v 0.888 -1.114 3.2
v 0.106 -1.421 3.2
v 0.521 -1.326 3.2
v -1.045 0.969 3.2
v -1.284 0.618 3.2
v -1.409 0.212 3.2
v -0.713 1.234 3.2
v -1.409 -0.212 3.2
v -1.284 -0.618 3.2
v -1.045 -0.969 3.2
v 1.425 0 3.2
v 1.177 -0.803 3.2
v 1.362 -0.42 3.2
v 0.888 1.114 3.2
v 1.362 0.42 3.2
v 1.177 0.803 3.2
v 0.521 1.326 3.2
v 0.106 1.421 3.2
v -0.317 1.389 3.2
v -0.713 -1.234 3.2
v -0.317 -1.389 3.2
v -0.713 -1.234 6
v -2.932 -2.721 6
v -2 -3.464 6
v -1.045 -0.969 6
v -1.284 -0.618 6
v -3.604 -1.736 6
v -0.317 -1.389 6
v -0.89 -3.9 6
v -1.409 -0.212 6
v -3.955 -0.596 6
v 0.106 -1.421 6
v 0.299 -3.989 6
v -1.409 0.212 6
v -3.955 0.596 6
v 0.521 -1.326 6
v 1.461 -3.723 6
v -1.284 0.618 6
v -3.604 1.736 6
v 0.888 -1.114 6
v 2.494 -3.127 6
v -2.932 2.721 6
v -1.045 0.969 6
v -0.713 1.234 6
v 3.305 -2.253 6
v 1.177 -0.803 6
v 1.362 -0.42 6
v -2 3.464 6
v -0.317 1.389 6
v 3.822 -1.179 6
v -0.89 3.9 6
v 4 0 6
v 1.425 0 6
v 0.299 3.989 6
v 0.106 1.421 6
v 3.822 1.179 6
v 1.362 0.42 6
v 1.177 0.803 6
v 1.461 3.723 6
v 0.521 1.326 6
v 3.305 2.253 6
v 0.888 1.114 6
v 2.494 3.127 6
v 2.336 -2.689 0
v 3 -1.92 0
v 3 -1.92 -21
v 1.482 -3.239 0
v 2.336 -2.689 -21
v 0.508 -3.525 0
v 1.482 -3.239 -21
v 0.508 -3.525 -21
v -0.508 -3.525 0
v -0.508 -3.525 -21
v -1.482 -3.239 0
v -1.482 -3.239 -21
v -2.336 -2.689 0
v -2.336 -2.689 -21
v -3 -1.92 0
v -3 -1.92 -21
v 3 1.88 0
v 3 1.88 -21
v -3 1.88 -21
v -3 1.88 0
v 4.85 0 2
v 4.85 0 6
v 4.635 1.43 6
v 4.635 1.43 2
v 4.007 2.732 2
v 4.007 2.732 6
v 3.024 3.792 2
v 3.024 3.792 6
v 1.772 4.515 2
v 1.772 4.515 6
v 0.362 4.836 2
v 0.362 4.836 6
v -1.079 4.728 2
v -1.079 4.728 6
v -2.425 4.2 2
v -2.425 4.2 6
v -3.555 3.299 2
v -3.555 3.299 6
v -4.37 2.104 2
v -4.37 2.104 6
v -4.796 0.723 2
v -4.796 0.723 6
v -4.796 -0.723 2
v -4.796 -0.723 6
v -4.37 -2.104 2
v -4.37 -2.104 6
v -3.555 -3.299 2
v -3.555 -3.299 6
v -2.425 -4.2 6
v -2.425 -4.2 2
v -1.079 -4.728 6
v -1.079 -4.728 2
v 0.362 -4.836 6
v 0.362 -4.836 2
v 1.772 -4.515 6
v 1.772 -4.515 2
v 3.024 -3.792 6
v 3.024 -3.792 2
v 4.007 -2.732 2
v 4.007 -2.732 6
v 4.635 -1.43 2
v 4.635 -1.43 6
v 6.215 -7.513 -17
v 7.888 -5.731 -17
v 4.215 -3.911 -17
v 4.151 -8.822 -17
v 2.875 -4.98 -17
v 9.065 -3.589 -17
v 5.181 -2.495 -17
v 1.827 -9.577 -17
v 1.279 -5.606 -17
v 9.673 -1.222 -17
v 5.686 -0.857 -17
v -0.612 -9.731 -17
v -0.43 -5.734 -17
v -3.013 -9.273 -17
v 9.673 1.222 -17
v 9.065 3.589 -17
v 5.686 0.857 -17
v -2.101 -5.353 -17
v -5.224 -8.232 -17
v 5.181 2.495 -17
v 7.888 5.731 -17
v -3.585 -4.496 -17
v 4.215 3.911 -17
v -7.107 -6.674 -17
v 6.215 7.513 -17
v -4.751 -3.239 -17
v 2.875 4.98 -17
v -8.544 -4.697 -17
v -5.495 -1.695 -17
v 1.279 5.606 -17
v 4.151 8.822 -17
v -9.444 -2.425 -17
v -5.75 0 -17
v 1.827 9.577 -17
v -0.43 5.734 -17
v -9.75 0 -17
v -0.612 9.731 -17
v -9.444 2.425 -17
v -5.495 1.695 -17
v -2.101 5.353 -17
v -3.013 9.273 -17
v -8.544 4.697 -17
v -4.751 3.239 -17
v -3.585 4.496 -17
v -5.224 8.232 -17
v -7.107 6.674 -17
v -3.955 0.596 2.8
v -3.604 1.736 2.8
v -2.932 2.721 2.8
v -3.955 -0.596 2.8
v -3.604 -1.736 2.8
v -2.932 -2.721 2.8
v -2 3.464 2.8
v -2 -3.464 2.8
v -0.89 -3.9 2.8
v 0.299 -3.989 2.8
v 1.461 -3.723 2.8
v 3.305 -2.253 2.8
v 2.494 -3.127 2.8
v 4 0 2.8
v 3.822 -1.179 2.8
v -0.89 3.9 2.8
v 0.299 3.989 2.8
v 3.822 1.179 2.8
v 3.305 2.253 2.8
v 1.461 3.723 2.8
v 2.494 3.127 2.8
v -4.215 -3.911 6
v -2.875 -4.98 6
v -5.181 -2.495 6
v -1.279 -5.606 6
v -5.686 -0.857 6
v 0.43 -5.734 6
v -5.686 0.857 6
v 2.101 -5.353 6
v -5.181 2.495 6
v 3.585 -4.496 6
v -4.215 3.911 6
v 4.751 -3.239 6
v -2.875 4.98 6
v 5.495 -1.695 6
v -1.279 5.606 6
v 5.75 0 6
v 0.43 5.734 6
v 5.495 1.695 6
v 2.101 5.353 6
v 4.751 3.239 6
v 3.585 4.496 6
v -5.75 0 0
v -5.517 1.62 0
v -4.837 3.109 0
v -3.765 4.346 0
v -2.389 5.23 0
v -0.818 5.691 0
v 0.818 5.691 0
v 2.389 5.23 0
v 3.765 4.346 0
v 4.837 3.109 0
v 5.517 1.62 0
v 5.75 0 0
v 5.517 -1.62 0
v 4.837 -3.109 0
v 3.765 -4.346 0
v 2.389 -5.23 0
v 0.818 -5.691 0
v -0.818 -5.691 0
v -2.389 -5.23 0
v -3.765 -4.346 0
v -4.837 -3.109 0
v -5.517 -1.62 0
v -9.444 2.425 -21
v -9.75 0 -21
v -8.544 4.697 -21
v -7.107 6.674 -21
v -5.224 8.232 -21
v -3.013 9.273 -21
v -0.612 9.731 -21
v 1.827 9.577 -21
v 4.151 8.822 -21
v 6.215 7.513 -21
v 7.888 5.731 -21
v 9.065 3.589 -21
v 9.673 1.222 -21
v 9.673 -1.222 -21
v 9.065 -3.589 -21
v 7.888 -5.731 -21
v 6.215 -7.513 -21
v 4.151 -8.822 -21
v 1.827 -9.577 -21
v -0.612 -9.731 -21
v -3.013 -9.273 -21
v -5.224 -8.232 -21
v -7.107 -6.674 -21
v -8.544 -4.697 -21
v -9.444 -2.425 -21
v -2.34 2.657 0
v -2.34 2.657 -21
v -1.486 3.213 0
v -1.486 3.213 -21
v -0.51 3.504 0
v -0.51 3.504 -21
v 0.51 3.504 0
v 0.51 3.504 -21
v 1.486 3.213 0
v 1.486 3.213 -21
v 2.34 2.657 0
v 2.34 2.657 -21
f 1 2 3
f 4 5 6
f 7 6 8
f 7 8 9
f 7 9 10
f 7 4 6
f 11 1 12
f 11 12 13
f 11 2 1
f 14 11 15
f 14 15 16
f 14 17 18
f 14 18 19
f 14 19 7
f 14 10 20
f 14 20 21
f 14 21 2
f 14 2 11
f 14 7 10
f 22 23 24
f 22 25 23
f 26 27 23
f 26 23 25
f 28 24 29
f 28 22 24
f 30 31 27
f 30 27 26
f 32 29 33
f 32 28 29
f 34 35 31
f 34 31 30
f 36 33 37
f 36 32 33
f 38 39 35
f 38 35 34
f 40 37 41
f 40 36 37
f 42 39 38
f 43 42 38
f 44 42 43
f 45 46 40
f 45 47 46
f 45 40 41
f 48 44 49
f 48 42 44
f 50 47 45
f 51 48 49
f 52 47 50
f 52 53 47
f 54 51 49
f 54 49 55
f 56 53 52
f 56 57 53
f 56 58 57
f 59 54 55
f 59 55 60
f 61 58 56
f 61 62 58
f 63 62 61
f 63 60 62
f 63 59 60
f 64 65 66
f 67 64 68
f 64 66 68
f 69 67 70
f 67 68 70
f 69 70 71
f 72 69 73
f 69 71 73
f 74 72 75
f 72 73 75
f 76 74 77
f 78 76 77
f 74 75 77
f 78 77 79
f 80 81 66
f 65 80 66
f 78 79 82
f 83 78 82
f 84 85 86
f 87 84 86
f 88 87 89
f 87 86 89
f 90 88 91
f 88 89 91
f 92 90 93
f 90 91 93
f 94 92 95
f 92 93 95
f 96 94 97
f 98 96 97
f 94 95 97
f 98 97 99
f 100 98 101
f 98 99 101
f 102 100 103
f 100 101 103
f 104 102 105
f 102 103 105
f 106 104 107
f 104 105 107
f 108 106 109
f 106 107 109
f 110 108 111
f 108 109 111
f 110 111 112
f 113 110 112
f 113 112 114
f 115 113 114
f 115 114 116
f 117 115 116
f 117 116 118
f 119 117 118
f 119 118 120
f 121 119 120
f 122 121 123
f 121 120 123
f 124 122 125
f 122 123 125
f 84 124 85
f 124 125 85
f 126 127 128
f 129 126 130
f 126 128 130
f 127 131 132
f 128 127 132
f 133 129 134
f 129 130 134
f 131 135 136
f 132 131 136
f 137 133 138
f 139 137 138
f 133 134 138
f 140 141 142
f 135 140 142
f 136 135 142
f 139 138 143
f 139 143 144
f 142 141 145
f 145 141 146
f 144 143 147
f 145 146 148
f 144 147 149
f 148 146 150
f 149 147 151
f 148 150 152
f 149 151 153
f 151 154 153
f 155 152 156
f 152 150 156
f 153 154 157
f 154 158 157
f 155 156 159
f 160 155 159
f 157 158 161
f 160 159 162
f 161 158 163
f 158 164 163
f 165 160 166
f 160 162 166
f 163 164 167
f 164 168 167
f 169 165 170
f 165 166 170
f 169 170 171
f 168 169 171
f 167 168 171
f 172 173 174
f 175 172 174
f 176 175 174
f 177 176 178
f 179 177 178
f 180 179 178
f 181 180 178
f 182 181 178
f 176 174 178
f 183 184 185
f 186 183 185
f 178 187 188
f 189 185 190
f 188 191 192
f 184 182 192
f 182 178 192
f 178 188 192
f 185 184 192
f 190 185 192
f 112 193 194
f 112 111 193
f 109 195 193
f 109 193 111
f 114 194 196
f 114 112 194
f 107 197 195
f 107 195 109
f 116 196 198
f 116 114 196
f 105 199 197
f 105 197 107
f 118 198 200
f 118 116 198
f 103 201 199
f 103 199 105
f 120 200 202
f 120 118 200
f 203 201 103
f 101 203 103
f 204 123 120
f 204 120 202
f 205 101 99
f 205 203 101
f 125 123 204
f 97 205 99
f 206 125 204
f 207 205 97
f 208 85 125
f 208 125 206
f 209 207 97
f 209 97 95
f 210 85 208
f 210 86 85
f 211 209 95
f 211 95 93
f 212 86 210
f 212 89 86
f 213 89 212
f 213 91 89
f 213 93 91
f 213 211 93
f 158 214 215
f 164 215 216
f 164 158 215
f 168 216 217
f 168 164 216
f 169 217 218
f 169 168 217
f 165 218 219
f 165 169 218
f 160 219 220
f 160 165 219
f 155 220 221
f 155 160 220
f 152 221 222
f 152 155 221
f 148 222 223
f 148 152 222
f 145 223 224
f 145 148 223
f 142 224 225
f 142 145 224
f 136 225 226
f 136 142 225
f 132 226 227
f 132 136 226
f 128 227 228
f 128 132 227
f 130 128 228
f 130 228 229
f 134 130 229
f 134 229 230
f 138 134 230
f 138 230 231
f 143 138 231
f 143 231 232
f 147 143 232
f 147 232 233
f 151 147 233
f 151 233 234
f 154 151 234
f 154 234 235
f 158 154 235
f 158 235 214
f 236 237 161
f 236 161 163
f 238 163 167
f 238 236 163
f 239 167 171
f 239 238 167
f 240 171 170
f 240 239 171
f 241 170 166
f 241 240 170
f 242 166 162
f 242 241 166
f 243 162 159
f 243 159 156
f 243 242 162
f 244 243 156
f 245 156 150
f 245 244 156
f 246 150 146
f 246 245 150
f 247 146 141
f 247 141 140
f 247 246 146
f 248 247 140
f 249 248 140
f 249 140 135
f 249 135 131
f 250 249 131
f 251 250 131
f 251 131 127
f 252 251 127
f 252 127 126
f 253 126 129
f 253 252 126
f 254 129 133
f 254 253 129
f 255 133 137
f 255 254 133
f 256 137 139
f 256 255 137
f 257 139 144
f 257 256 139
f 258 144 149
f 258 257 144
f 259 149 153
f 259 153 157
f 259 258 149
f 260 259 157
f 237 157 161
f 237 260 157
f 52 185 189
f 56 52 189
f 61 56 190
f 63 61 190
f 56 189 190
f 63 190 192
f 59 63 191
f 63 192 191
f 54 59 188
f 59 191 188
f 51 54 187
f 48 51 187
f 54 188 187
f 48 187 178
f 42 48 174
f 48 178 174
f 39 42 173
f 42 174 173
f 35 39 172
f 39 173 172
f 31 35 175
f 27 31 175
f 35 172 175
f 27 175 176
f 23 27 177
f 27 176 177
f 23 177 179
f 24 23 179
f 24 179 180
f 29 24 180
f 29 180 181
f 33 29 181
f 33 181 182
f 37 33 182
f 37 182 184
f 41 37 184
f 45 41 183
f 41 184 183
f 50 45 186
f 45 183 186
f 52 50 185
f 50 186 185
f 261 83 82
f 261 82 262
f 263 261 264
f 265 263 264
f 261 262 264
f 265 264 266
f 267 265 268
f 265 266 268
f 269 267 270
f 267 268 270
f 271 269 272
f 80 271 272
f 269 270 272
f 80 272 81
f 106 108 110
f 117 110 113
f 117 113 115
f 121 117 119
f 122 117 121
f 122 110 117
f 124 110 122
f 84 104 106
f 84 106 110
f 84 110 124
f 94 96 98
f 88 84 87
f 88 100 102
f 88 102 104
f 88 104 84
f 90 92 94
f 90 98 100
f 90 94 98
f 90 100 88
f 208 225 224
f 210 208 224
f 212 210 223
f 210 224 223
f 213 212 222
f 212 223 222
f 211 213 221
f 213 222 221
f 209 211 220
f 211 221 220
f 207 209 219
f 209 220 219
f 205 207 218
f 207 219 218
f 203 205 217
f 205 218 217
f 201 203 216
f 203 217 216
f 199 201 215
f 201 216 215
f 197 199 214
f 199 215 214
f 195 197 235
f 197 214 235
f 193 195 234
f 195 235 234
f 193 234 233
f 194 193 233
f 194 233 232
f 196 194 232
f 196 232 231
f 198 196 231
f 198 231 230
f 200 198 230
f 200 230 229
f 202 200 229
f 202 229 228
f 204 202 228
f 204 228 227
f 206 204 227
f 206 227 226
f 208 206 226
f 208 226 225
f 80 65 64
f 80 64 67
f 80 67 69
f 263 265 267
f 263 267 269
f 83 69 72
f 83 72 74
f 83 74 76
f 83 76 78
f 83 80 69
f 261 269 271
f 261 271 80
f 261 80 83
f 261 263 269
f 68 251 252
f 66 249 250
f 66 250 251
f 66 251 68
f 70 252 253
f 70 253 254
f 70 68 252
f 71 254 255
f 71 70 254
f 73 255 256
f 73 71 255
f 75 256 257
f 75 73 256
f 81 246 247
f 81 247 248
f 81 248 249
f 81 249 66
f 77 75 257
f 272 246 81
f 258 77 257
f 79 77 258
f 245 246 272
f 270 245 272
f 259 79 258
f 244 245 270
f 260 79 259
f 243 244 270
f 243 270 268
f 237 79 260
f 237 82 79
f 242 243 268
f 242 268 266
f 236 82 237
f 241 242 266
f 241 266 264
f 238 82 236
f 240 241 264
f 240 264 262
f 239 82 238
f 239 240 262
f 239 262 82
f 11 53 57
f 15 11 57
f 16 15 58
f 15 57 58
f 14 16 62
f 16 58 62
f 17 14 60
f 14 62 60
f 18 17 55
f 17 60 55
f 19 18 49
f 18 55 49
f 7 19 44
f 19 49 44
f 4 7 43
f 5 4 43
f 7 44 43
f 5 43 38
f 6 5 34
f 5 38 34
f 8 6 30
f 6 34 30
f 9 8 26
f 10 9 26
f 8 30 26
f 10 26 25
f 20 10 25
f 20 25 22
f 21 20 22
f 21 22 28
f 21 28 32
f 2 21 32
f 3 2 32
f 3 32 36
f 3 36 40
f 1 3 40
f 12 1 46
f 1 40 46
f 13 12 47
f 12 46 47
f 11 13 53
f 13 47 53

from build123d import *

# Parameters (mm, degrees)
SKETCH2_R           = 5.75
BOSS_EXTRUDE1_DEPTH = 6
SKETCH3_R           = 4.85
CUT_EXTRUDE1_DEPTH  = 4
SKETCH4_R           = 4.75
BOSS_EXTRUDE2_DEPTH = 21
CUT_EXTRUDE2_DEPTH  = 21
SKETCH7_R           = 4
BOSS_EXTRUDE3_DEPTH = 3.2
SKETCH8_R           = 1.425
CUT_EXTRUDE3_DEPTH  = 2.8
SKETCH11_R          = 5.75
SKETCH11_R_2        = 4.75
BOSS_EXTRUDE5_DEPTH = 21
SKETCH12_R          = 9.75
SKETCH12_R_2        = 5.75
BOSS_EXTRUDE6_DEPTH = 4


with BuildPart() as part:
    # Sketch2 → Boss-Extrude1 (new body)
    with BuildSketch(Plane.XY):
        Circle(SKETCH2_R)
    extrude(amount=BOSS_EXTRUDE1_DEPTH)

    # Sketch3 → Cut-Extrude1 (cut)
    with BuildSketch(Plane.XY.offset(6)):
        Circle(SKETCH3_R)
    extrude(amount=-CUT_EXTRUDE1_DEPTH, mode=Mode.SUBTRACT)

    # Sketch4 → Boss-Extrude2 (add)
    with BuildSketch(Plane(origin=(0, 0, 0), x_dir=(-1, 0, 0), z_dir=(0, 0, -1))):
        with Locations(Location((0, 0, 0), (0, 0, 180))):
            Circle(SKETCH4_R)
    extrude(amount=BOSS_EXTRUDE2_DEPTH)

    # Sketch5 → Cut-Extrude2 (cut)
    with BuildSketch(Plane(origin=(0, 0, -21), x_dir=(-1, 0, 0), z_dir=(0, 0, -1))):
        with BuildLine():
            Line((-3, 1.880175896), (-3, -1.919824104))
            ThreePointArc((-3, -1.919824104), (0, -3.561702485), (3, -1.919824104))
            Line((3, -1.919824104), (3, 1.880175896))
            ThreePointArc((3, 1.880175896), (0, 3.540488865), (-3, 1.880175896))
        make_face()
    extrude(amount=-CUT_EXTRUDE2_DEPTH, mode=Mode.SUBTRACT)

    # Sketch11 → Boss-Extrude5 (add)
    with BuildSketch(Plane(origin=(0, 0, -21), x_dir=(-1, 0, 0), z_dir=(0, 0, -1))):
        Circle(SKETCH11_R)
        Circle(SKETCH11_R_2, mode=Mode.SUBTRACT)
    extrude(amount=-BOSS_EXTRUDE5_DEPTH)

    # Sketch12 → Boss-Extrude6 (add)
    with BuildSketch(Plane(origin=(0, 0, -21), x_dir=(-1, 0, 0), z_dir=(0, 0, -1))):
        Circle(SKETCH12_R)
        Circle(SKETCH12_R_2, mode=Mode.SUBTRACT)
    extrude(amount=-BOSS_EXTRUDE6_DEPTH)


with BuildPart() as body_2:
    # Sketch7 → Boss-Extrude3 (new body)
    with BuildSketch(Plane.XY.offset(2.8)):
        Circle(SKETCH7_R)
    extrude(amount=BOSS_EXTRUDE3_DEPTH)

    # Sketch8 → Cut-Extrude3 (cut)
    with BuildSketch(Plane.XY.offset(6)):
        Circle(SKETCH8_R)
    extrude(amount=-CUT_EXTRUDE3_DEPTH, mode=Mode.SUBTRACT)


solid = Compound([part.part, body_2.part])
